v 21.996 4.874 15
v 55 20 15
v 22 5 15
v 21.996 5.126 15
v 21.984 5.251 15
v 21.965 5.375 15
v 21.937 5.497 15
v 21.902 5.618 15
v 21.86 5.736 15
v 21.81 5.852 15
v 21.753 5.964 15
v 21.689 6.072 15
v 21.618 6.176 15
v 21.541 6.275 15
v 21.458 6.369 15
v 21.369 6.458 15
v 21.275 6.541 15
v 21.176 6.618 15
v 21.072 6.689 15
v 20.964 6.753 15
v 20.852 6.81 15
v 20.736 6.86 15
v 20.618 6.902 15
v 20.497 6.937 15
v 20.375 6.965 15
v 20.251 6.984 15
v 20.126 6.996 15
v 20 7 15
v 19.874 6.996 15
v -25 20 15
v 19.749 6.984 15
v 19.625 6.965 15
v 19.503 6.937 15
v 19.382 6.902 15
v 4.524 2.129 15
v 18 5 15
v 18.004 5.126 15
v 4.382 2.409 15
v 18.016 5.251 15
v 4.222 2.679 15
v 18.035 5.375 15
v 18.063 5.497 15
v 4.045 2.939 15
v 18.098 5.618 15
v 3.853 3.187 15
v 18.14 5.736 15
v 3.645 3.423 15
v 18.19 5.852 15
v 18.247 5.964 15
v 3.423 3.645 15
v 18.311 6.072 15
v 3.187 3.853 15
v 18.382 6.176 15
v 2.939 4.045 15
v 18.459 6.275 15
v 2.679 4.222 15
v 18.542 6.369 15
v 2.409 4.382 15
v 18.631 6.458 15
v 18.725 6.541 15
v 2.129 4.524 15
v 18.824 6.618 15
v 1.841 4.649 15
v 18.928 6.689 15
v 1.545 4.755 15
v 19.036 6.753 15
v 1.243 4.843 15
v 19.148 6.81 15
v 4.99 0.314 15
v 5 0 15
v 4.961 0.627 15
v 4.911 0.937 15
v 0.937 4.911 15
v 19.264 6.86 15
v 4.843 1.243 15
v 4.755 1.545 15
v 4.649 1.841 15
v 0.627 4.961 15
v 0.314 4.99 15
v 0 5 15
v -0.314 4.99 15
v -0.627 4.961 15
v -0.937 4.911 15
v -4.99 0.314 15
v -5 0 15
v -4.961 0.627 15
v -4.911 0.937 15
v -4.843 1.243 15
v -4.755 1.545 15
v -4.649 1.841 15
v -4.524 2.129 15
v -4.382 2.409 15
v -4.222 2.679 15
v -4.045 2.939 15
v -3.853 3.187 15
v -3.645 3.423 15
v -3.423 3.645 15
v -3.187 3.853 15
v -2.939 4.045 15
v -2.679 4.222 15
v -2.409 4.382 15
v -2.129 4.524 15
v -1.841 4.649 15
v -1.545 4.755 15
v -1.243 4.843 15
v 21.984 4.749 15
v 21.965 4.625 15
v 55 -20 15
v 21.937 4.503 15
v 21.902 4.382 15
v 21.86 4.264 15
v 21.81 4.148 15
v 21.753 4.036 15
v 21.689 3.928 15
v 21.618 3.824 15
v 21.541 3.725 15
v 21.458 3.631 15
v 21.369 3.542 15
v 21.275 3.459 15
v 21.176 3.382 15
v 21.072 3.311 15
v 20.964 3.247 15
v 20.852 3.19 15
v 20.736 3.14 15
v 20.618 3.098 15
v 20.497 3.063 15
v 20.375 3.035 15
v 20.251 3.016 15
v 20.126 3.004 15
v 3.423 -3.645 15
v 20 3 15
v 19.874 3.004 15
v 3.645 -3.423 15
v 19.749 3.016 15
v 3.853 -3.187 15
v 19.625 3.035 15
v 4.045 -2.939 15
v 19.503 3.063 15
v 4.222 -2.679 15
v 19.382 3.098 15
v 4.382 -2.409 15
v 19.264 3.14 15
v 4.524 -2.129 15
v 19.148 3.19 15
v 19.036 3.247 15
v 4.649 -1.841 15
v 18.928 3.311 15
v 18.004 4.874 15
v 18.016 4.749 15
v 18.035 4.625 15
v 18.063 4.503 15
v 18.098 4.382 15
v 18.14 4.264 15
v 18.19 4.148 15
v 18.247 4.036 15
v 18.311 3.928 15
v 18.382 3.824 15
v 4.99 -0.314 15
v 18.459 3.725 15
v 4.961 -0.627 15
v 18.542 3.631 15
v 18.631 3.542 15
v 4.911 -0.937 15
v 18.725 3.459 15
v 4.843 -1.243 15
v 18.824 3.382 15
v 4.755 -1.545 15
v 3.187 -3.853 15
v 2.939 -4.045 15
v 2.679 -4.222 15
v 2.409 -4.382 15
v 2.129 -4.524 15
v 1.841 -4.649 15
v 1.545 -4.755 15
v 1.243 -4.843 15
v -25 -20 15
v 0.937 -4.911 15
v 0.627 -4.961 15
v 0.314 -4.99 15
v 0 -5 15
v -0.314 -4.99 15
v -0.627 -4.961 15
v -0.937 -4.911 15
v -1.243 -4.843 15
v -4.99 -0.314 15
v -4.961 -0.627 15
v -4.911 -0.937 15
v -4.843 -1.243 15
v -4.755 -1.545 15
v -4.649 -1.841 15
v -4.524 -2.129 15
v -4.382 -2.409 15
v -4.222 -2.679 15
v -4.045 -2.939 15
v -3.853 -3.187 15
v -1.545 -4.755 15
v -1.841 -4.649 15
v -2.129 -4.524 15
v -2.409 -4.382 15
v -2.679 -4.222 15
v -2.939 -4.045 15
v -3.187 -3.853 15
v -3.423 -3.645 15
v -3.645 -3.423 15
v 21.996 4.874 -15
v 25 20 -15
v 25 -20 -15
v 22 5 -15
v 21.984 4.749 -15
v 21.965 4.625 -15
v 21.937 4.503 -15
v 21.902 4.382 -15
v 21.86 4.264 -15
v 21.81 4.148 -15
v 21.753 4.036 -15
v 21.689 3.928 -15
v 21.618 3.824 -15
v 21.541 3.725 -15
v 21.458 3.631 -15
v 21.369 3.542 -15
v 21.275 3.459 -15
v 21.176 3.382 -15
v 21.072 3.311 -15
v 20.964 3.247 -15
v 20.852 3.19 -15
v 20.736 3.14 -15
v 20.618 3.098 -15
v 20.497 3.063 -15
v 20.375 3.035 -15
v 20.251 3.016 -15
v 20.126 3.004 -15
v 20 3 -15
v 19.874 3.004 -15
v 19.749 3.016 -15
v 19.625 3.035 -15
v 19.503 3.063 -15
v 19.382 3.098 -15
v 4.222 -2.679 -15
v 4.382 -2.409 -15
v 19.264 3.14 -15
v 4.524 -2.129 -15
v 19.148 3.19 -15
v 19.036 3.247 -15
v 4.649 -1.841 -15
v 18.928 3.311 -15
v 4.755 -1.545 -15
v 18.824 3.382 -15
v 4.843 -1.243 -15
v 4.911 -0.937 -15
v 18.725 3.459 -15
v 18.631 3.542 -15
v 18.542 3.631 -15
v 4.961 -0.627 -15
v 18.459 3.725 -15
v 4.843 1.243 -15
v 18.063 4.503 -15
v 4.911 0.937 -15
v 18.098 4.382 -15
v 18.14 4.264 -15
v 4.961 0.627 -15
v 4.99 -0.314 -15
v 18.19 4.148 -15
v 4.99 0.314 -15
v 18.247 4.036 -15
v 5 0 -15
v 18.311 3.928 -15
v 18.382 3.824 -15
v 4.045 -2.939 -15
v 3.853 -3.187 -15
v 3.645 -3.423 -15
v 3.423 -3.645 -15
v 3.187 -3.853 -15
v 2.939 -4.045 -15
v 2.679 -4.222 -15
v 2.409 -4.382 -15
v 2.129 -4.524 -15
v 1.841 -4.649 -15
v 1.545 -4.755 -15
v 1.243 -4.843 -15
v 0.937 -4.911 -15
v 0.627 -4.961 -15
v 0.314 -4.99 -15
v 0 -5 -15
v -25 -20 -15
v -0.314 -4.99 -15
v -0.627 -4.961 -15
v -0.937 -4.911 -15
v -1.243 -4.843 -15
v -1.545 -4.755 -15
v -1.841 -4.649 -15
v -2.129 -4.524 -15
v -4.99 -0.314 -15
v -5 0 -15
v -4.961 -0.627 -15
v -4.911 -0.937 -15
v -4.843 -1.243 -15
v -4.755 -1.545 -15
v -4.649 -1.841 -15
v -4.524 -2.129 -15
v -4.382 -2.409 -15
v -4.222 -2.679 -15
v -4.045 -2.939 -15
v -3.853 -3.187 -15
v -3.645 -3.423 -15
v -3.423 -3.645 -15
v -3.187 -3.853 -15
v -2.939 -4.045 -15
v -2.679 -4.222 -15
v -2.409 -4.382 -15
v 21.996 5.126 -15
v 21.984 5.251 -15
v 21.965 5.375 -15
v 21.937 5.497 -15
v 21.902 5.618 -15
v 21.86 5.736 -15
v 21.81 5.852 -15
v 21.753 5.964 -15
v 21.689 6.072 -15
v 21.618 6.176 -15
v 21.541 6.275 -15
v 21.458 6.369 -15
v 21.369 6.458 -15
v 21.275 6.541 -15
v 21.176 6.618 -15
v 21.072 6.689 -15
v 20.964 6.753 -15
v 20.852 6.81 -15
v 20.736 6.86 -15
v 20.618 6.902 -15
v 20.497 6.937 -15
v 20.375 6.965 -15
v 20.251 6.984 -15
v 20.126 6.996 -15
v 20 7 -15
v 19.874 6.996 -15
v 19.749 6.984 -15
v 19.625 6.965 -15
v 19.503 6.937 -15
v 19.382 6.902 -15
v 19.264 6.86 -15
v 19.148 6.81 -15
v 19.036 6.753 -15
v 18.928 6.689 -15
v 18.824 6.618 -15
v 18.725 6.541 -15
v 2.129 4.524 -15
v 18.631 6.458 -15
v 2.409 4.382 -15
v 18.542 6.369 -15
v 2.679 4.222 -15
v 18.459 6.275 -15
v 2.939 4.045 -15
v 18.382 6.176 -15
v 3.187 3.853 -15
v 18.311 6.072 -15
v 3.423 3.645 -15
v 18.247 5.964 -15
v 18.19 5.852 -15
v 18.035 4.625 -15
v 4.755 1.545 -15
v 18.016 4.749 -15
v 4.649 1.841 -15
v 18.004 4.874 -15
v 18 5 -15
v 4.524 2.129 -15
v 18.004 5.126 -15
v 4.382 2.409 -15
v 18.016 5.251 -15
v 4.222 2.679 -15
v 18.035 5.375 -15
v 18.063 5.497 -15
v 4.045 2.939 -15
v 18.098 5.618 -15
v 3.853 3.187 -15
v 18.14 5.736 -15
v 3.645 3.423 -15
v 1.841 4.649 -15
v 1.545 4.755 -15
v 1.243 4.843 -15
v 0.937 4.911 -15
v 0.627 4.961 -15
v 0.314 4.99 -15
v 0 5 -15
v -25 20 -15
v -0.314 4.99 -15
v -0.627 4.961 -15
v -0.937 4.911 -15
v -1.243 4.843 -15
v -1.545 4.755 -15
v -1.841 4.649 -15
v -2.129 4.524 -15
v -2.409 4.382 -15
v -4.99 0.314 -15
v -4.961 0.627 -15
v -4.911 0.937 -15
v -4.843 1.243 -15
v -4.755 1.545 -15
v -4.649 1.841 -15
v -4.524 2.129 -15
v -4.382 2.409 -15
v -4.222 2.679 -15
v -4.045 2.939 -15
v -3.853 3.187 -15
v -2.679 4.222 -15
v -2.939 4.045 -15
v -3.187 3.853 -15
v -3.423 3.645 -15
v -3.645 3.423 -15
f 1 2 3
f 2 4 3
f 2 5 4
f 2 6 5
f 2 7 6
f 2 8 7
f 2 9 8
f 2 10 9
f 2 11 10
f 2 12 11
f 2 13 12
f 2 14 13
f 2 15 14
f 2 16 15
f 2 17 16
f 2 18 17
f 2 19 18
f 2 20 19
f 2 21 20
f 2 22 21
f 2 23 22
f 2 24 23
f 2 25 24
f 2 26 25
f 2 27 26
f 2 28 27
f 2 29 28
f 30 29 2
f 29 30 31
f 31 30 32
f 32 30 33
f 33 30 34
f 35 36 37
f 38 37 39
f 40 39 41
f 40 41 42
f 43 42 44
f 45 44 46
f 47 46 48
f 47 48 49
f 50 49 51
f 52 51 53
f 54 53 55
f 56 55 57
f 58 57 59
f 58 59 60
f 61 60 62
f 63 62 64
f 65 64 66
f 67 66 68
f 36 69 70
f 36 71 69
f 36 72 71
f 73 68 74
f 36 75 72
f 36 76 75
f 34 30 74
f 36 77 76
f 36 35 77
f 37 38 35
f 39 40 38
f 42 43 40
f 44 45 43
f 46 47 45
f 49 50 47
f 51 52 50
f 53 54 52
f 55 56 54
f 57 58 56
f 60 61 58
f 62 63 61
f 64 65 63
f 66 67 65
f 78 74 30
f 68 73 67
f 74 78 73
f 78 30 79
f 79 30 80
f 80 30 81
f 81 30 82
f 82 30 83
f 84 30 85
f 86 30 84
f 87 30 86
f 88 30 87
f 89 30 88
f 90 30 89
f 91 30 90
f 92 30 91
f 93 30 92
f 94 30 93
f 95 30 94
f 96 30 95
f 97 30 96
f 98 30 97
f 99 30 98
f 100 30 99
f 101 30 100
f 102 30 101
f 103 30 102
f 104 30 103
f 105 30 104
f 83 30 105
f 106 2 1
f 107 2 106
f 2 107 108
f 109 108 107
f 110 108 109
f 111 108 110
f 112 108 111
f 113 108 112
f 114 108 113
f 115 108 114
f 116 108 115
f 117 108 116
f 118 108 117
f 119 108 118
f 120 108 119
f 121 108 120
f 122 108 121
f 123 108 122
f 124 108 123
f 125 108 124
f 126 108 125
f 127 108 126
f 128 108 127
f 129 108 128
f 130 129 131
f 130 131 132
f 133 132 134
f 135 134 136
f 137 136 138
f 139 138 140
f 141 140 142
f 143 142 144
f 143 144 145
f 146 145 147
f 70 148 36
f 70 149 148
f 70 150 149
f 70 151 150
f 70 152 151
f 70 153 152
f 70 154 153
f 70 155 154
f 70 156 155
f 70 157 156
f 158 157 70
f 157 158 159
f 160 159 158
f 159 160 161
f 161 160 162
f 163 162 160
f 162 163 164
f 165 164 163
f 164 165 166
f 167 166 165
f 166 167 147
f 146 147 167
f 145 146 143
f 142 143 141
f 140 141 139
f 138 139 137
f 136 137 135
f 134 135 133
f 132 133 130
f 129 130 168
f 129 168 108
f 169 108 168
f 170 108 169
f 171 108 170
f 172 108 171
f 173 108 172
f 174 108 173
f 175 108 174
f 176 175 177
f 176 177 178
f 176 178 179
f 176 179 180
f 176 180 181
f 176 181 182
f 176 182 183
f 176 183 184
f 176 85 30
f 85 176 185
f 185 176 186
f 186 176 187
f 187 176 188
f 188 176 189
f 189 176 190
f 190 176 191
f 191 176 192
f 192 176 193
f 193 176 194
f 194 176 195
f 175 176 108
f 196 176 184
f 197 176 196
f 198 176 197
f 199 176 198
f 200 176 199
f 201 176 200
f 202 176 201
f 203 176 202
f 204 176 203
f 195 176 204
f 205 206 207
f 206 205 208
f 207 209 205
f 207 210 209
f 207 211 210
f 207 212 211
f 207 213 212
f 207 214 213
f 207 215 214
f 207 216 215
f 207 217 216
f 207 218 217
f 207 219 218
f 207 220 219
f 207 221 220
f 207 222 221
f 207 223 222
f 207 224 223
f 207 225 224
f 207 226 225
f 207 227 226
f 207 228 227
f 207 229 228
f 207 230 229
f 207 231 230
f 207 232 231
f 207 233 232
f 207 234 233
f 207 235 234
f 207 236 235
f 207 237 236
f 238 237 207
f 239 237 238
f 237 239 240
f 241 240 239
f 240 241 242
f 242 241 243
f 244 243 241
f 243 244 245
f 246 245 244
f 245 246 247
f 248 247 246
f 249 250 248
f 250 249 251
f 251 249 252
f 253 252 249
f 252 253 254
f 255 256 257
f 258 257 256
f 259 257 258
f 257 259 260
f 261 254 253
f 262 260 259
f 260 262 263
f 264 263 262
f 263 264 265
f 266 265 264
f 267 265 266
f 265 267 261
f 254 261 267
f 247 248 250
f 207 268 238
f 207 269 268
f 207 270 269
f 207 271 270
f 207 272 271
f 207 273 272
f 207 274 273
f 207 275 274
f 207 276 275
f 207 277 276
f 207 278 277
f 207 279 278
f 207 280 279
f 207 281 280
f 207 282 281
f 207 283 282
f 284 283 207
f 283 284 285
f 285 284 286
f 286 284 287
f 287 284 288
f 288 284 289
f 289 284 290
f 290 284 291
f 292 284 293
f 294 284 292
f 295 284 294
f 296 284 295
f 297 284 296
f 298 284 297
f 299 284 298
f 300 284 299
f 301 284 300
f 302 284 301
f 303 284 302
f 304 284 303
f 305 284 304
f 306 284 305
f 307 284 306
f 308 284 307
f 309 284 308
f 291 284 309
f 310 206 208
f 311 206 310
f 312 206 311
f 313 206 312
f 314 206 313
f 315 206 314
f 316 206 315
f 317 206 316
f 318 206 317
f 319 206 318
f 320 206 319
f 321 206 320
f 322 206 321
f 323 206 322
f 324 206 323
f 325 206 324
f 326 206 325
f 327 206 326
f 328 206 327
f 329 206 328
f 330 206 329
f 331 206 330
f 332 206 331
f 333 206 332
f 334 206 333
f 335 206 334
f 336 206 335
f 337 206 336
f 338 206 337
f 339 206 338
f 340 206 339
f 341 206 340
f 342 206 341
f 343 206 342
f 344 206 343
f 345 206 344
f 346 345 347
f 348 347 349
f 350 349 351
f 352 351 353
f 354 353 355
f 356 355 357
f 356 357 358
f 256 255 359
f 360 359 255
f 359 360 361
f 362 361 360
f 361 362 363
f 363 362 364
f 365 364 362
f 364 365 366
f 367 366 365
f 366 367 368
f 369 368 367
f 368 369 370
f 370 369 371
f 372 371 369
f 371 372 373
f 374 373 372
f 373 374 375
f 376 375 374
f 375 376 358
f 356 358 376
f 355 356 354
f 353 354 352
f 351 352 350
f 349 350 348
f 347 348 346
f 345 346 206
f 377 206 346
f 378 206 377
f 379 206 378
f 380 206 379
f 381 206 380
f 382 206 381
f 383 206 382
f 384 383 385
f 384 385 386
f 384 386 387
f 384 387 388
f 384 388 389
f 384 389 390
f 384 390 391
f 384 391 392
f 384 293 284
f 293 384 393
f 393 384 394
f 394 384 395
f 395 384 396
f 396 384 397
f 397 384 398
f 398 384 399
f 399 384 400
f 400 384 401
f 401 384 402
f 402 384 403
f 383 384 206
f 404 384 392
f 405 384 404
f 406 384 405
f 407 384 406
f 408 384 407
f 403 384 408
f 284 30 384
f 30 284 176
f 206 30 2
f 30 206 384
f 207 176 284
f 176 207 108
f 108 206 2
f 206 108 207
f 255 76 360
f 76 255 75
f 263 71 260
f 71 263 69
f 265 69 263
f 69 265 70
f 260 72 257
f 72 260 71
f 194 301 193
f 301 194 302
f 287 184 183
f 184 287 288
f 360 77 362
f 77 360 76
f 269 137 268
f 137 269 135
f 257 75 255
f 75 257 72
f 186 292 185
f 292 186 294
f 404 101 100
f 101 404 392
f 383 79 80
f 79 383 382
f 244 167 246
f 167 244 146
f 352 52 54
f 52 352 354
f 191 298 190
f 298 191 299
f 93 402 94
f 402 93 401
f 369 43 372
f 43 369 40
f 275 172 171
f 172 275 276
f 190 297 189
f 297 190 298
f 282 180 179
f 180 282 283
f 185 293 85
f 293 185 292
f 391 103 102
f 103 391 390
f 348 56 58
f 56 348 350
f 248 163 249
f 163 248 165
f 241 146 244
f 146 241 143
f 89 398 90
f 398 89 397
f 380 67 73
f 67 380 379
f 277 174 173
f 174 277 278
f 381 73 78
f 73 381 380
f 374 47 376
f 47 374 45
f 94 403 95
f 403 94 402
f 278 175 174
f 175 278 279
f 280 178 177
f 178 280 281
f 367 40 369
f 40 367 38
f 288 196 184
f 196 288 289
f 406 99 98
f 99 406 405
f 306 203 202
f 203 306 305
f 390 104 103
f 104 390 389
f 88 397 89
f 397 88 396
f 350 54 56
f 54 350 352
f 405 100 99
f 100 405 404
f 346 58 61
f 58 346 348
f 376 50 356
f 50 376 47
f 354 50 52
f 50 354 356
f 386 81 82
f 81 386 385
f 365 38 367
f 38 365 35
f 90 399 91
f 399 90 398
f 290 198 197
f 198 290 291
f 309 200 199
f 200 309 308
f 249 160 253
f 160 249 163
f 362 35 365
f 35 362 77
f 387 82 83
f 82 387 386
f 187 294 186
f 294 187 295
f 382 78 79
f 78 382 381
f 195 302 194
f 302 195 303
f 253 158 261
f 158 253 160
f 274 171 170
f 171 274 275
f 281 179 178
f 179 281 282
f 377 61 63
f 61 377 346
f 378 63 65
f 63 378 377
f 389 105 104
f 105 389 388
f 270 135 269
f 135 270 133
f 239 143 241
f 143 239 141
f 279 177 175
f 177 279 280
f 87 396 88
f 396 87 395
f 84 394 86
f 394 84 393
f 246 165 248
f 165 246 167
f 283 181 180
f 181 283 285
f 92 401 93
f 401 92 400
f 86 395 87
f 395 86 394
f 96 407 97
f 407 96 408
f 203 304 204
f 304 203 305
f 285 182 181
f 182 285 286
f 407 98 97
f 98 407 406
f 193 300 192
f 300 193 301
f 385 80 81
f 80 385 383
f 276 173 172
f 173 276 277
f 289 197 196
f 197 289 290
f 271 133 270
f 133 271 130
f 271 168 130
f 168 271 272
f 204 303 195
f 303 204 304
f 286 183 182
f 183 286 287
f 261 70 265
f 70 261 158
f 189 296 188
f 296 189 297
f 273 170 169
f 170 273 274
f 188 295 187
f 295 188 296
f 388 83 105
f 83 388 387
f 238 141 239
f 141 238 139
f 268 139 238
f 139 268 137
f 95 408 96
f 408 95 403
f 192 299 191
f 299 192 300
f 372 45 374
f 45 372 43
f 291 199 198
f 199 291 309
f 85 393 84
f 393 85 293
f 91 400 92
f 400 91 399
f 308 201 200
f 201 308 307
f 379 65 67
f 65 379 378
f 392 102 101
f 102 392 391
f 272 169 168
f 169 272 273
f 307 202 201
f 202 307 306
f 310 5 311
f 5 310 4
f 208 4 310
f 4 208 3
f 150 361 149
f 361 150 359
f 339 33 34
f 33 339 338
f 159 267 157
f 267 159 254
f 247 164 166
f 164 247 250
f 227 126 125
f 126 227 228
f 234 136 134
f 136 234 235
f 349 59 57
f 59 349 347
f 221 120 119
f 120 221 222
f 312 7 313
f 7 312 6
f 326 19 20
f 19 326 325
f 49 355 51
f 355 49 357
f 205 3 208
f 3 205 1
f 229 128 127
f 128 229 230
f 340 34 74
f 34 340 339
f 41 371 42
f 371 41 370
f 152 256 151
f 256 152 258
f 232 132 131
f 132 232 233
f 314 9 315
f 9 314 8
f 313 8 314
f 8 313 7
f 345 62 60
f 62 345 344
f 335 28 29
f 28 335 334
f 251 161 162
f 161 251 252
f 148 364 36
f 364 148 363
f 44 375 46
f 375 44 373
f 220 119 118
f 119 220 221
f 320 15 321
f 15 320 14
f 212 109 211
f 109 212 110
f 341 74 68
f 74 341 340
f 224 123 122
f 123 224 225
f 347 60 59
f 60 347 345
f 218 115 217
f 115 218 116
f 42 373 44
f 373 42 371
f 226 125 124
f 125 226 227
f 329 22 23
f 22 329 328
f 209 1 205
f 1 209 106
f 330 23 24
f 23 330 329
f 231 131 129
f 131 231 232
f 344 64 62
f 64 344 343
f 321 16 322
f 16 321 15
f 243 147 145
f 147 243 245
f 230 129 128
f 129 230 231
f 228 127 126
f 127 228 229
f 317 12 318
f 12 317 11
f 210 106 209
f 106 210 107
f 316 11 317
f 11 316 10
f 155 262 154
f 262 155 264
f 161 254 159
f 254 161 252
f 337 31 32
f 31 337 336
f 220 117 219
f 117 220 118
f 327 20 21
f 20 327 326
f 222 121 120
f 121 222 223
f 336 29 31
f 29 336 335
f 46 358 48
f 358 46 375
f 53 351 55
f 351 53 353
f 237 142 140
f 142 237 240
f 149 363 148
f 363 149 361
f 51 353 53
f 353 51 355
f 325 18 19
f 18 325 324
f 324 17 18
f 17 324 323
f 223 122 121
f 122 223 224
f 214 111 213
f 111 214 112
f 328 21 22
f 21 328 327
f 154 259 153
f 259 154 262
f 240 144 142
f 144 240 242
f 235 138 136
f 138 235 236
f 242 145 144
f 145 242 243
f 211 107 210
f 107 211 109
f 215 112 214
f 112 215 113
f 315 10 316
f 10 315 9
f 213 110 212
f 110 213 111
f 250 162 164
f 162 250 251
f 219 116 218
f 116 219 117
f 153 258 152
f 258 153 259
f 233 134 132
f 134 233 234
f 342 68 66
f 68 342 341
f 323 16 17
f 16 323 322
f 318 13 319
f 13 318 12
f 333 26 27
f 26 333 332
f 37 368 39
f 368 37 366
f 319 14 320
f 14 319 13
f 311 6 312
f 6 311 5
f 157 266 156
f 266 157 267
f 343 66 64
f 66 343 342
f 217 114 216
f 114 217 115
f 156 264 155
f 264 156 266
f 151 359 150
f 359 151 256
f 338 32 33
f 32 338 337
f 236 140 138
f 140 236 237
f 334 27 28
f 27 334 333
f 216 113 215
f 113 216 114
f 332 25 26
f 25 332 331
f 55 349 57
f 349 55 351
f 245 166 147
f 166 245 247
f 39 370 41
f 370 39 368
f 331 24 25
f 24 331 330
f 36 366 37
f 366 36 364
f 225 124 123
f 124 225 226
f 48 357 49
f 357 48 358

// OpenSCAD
length = 40;
width = 50;
height = 30;

// The `difference` function subtracts the second thing from the first thing.
difference() {
    // Here's the basic shape. Union makes the multiple shapes into a single thing.
    union() {
        cube([width, length, height], center=true);
        translate([width/2, length/2, -height/2]) {
            rotate([90, 0, 0]) {
                linear_extrude(height=length) {
                    polygon([[0, 0],[0, height],[30, height]]);
                }
            }
        }
    }
    // Here are the cylinders that we're subtracting from the carriage.
    // I've unioned them together so that together they're the second
    // argument to the `difference` function.
    union() {
        // The $fn=100 is what makes this a nice smooth cylinder instead
        // of blocky garbage.
        cylinder(h = 100, r=5, center = true, $fn=100);
        translate([20, 5, 0]) {
            cylinder(h = 100, r=2, center = true, $fn=100);
        }
    }
}
